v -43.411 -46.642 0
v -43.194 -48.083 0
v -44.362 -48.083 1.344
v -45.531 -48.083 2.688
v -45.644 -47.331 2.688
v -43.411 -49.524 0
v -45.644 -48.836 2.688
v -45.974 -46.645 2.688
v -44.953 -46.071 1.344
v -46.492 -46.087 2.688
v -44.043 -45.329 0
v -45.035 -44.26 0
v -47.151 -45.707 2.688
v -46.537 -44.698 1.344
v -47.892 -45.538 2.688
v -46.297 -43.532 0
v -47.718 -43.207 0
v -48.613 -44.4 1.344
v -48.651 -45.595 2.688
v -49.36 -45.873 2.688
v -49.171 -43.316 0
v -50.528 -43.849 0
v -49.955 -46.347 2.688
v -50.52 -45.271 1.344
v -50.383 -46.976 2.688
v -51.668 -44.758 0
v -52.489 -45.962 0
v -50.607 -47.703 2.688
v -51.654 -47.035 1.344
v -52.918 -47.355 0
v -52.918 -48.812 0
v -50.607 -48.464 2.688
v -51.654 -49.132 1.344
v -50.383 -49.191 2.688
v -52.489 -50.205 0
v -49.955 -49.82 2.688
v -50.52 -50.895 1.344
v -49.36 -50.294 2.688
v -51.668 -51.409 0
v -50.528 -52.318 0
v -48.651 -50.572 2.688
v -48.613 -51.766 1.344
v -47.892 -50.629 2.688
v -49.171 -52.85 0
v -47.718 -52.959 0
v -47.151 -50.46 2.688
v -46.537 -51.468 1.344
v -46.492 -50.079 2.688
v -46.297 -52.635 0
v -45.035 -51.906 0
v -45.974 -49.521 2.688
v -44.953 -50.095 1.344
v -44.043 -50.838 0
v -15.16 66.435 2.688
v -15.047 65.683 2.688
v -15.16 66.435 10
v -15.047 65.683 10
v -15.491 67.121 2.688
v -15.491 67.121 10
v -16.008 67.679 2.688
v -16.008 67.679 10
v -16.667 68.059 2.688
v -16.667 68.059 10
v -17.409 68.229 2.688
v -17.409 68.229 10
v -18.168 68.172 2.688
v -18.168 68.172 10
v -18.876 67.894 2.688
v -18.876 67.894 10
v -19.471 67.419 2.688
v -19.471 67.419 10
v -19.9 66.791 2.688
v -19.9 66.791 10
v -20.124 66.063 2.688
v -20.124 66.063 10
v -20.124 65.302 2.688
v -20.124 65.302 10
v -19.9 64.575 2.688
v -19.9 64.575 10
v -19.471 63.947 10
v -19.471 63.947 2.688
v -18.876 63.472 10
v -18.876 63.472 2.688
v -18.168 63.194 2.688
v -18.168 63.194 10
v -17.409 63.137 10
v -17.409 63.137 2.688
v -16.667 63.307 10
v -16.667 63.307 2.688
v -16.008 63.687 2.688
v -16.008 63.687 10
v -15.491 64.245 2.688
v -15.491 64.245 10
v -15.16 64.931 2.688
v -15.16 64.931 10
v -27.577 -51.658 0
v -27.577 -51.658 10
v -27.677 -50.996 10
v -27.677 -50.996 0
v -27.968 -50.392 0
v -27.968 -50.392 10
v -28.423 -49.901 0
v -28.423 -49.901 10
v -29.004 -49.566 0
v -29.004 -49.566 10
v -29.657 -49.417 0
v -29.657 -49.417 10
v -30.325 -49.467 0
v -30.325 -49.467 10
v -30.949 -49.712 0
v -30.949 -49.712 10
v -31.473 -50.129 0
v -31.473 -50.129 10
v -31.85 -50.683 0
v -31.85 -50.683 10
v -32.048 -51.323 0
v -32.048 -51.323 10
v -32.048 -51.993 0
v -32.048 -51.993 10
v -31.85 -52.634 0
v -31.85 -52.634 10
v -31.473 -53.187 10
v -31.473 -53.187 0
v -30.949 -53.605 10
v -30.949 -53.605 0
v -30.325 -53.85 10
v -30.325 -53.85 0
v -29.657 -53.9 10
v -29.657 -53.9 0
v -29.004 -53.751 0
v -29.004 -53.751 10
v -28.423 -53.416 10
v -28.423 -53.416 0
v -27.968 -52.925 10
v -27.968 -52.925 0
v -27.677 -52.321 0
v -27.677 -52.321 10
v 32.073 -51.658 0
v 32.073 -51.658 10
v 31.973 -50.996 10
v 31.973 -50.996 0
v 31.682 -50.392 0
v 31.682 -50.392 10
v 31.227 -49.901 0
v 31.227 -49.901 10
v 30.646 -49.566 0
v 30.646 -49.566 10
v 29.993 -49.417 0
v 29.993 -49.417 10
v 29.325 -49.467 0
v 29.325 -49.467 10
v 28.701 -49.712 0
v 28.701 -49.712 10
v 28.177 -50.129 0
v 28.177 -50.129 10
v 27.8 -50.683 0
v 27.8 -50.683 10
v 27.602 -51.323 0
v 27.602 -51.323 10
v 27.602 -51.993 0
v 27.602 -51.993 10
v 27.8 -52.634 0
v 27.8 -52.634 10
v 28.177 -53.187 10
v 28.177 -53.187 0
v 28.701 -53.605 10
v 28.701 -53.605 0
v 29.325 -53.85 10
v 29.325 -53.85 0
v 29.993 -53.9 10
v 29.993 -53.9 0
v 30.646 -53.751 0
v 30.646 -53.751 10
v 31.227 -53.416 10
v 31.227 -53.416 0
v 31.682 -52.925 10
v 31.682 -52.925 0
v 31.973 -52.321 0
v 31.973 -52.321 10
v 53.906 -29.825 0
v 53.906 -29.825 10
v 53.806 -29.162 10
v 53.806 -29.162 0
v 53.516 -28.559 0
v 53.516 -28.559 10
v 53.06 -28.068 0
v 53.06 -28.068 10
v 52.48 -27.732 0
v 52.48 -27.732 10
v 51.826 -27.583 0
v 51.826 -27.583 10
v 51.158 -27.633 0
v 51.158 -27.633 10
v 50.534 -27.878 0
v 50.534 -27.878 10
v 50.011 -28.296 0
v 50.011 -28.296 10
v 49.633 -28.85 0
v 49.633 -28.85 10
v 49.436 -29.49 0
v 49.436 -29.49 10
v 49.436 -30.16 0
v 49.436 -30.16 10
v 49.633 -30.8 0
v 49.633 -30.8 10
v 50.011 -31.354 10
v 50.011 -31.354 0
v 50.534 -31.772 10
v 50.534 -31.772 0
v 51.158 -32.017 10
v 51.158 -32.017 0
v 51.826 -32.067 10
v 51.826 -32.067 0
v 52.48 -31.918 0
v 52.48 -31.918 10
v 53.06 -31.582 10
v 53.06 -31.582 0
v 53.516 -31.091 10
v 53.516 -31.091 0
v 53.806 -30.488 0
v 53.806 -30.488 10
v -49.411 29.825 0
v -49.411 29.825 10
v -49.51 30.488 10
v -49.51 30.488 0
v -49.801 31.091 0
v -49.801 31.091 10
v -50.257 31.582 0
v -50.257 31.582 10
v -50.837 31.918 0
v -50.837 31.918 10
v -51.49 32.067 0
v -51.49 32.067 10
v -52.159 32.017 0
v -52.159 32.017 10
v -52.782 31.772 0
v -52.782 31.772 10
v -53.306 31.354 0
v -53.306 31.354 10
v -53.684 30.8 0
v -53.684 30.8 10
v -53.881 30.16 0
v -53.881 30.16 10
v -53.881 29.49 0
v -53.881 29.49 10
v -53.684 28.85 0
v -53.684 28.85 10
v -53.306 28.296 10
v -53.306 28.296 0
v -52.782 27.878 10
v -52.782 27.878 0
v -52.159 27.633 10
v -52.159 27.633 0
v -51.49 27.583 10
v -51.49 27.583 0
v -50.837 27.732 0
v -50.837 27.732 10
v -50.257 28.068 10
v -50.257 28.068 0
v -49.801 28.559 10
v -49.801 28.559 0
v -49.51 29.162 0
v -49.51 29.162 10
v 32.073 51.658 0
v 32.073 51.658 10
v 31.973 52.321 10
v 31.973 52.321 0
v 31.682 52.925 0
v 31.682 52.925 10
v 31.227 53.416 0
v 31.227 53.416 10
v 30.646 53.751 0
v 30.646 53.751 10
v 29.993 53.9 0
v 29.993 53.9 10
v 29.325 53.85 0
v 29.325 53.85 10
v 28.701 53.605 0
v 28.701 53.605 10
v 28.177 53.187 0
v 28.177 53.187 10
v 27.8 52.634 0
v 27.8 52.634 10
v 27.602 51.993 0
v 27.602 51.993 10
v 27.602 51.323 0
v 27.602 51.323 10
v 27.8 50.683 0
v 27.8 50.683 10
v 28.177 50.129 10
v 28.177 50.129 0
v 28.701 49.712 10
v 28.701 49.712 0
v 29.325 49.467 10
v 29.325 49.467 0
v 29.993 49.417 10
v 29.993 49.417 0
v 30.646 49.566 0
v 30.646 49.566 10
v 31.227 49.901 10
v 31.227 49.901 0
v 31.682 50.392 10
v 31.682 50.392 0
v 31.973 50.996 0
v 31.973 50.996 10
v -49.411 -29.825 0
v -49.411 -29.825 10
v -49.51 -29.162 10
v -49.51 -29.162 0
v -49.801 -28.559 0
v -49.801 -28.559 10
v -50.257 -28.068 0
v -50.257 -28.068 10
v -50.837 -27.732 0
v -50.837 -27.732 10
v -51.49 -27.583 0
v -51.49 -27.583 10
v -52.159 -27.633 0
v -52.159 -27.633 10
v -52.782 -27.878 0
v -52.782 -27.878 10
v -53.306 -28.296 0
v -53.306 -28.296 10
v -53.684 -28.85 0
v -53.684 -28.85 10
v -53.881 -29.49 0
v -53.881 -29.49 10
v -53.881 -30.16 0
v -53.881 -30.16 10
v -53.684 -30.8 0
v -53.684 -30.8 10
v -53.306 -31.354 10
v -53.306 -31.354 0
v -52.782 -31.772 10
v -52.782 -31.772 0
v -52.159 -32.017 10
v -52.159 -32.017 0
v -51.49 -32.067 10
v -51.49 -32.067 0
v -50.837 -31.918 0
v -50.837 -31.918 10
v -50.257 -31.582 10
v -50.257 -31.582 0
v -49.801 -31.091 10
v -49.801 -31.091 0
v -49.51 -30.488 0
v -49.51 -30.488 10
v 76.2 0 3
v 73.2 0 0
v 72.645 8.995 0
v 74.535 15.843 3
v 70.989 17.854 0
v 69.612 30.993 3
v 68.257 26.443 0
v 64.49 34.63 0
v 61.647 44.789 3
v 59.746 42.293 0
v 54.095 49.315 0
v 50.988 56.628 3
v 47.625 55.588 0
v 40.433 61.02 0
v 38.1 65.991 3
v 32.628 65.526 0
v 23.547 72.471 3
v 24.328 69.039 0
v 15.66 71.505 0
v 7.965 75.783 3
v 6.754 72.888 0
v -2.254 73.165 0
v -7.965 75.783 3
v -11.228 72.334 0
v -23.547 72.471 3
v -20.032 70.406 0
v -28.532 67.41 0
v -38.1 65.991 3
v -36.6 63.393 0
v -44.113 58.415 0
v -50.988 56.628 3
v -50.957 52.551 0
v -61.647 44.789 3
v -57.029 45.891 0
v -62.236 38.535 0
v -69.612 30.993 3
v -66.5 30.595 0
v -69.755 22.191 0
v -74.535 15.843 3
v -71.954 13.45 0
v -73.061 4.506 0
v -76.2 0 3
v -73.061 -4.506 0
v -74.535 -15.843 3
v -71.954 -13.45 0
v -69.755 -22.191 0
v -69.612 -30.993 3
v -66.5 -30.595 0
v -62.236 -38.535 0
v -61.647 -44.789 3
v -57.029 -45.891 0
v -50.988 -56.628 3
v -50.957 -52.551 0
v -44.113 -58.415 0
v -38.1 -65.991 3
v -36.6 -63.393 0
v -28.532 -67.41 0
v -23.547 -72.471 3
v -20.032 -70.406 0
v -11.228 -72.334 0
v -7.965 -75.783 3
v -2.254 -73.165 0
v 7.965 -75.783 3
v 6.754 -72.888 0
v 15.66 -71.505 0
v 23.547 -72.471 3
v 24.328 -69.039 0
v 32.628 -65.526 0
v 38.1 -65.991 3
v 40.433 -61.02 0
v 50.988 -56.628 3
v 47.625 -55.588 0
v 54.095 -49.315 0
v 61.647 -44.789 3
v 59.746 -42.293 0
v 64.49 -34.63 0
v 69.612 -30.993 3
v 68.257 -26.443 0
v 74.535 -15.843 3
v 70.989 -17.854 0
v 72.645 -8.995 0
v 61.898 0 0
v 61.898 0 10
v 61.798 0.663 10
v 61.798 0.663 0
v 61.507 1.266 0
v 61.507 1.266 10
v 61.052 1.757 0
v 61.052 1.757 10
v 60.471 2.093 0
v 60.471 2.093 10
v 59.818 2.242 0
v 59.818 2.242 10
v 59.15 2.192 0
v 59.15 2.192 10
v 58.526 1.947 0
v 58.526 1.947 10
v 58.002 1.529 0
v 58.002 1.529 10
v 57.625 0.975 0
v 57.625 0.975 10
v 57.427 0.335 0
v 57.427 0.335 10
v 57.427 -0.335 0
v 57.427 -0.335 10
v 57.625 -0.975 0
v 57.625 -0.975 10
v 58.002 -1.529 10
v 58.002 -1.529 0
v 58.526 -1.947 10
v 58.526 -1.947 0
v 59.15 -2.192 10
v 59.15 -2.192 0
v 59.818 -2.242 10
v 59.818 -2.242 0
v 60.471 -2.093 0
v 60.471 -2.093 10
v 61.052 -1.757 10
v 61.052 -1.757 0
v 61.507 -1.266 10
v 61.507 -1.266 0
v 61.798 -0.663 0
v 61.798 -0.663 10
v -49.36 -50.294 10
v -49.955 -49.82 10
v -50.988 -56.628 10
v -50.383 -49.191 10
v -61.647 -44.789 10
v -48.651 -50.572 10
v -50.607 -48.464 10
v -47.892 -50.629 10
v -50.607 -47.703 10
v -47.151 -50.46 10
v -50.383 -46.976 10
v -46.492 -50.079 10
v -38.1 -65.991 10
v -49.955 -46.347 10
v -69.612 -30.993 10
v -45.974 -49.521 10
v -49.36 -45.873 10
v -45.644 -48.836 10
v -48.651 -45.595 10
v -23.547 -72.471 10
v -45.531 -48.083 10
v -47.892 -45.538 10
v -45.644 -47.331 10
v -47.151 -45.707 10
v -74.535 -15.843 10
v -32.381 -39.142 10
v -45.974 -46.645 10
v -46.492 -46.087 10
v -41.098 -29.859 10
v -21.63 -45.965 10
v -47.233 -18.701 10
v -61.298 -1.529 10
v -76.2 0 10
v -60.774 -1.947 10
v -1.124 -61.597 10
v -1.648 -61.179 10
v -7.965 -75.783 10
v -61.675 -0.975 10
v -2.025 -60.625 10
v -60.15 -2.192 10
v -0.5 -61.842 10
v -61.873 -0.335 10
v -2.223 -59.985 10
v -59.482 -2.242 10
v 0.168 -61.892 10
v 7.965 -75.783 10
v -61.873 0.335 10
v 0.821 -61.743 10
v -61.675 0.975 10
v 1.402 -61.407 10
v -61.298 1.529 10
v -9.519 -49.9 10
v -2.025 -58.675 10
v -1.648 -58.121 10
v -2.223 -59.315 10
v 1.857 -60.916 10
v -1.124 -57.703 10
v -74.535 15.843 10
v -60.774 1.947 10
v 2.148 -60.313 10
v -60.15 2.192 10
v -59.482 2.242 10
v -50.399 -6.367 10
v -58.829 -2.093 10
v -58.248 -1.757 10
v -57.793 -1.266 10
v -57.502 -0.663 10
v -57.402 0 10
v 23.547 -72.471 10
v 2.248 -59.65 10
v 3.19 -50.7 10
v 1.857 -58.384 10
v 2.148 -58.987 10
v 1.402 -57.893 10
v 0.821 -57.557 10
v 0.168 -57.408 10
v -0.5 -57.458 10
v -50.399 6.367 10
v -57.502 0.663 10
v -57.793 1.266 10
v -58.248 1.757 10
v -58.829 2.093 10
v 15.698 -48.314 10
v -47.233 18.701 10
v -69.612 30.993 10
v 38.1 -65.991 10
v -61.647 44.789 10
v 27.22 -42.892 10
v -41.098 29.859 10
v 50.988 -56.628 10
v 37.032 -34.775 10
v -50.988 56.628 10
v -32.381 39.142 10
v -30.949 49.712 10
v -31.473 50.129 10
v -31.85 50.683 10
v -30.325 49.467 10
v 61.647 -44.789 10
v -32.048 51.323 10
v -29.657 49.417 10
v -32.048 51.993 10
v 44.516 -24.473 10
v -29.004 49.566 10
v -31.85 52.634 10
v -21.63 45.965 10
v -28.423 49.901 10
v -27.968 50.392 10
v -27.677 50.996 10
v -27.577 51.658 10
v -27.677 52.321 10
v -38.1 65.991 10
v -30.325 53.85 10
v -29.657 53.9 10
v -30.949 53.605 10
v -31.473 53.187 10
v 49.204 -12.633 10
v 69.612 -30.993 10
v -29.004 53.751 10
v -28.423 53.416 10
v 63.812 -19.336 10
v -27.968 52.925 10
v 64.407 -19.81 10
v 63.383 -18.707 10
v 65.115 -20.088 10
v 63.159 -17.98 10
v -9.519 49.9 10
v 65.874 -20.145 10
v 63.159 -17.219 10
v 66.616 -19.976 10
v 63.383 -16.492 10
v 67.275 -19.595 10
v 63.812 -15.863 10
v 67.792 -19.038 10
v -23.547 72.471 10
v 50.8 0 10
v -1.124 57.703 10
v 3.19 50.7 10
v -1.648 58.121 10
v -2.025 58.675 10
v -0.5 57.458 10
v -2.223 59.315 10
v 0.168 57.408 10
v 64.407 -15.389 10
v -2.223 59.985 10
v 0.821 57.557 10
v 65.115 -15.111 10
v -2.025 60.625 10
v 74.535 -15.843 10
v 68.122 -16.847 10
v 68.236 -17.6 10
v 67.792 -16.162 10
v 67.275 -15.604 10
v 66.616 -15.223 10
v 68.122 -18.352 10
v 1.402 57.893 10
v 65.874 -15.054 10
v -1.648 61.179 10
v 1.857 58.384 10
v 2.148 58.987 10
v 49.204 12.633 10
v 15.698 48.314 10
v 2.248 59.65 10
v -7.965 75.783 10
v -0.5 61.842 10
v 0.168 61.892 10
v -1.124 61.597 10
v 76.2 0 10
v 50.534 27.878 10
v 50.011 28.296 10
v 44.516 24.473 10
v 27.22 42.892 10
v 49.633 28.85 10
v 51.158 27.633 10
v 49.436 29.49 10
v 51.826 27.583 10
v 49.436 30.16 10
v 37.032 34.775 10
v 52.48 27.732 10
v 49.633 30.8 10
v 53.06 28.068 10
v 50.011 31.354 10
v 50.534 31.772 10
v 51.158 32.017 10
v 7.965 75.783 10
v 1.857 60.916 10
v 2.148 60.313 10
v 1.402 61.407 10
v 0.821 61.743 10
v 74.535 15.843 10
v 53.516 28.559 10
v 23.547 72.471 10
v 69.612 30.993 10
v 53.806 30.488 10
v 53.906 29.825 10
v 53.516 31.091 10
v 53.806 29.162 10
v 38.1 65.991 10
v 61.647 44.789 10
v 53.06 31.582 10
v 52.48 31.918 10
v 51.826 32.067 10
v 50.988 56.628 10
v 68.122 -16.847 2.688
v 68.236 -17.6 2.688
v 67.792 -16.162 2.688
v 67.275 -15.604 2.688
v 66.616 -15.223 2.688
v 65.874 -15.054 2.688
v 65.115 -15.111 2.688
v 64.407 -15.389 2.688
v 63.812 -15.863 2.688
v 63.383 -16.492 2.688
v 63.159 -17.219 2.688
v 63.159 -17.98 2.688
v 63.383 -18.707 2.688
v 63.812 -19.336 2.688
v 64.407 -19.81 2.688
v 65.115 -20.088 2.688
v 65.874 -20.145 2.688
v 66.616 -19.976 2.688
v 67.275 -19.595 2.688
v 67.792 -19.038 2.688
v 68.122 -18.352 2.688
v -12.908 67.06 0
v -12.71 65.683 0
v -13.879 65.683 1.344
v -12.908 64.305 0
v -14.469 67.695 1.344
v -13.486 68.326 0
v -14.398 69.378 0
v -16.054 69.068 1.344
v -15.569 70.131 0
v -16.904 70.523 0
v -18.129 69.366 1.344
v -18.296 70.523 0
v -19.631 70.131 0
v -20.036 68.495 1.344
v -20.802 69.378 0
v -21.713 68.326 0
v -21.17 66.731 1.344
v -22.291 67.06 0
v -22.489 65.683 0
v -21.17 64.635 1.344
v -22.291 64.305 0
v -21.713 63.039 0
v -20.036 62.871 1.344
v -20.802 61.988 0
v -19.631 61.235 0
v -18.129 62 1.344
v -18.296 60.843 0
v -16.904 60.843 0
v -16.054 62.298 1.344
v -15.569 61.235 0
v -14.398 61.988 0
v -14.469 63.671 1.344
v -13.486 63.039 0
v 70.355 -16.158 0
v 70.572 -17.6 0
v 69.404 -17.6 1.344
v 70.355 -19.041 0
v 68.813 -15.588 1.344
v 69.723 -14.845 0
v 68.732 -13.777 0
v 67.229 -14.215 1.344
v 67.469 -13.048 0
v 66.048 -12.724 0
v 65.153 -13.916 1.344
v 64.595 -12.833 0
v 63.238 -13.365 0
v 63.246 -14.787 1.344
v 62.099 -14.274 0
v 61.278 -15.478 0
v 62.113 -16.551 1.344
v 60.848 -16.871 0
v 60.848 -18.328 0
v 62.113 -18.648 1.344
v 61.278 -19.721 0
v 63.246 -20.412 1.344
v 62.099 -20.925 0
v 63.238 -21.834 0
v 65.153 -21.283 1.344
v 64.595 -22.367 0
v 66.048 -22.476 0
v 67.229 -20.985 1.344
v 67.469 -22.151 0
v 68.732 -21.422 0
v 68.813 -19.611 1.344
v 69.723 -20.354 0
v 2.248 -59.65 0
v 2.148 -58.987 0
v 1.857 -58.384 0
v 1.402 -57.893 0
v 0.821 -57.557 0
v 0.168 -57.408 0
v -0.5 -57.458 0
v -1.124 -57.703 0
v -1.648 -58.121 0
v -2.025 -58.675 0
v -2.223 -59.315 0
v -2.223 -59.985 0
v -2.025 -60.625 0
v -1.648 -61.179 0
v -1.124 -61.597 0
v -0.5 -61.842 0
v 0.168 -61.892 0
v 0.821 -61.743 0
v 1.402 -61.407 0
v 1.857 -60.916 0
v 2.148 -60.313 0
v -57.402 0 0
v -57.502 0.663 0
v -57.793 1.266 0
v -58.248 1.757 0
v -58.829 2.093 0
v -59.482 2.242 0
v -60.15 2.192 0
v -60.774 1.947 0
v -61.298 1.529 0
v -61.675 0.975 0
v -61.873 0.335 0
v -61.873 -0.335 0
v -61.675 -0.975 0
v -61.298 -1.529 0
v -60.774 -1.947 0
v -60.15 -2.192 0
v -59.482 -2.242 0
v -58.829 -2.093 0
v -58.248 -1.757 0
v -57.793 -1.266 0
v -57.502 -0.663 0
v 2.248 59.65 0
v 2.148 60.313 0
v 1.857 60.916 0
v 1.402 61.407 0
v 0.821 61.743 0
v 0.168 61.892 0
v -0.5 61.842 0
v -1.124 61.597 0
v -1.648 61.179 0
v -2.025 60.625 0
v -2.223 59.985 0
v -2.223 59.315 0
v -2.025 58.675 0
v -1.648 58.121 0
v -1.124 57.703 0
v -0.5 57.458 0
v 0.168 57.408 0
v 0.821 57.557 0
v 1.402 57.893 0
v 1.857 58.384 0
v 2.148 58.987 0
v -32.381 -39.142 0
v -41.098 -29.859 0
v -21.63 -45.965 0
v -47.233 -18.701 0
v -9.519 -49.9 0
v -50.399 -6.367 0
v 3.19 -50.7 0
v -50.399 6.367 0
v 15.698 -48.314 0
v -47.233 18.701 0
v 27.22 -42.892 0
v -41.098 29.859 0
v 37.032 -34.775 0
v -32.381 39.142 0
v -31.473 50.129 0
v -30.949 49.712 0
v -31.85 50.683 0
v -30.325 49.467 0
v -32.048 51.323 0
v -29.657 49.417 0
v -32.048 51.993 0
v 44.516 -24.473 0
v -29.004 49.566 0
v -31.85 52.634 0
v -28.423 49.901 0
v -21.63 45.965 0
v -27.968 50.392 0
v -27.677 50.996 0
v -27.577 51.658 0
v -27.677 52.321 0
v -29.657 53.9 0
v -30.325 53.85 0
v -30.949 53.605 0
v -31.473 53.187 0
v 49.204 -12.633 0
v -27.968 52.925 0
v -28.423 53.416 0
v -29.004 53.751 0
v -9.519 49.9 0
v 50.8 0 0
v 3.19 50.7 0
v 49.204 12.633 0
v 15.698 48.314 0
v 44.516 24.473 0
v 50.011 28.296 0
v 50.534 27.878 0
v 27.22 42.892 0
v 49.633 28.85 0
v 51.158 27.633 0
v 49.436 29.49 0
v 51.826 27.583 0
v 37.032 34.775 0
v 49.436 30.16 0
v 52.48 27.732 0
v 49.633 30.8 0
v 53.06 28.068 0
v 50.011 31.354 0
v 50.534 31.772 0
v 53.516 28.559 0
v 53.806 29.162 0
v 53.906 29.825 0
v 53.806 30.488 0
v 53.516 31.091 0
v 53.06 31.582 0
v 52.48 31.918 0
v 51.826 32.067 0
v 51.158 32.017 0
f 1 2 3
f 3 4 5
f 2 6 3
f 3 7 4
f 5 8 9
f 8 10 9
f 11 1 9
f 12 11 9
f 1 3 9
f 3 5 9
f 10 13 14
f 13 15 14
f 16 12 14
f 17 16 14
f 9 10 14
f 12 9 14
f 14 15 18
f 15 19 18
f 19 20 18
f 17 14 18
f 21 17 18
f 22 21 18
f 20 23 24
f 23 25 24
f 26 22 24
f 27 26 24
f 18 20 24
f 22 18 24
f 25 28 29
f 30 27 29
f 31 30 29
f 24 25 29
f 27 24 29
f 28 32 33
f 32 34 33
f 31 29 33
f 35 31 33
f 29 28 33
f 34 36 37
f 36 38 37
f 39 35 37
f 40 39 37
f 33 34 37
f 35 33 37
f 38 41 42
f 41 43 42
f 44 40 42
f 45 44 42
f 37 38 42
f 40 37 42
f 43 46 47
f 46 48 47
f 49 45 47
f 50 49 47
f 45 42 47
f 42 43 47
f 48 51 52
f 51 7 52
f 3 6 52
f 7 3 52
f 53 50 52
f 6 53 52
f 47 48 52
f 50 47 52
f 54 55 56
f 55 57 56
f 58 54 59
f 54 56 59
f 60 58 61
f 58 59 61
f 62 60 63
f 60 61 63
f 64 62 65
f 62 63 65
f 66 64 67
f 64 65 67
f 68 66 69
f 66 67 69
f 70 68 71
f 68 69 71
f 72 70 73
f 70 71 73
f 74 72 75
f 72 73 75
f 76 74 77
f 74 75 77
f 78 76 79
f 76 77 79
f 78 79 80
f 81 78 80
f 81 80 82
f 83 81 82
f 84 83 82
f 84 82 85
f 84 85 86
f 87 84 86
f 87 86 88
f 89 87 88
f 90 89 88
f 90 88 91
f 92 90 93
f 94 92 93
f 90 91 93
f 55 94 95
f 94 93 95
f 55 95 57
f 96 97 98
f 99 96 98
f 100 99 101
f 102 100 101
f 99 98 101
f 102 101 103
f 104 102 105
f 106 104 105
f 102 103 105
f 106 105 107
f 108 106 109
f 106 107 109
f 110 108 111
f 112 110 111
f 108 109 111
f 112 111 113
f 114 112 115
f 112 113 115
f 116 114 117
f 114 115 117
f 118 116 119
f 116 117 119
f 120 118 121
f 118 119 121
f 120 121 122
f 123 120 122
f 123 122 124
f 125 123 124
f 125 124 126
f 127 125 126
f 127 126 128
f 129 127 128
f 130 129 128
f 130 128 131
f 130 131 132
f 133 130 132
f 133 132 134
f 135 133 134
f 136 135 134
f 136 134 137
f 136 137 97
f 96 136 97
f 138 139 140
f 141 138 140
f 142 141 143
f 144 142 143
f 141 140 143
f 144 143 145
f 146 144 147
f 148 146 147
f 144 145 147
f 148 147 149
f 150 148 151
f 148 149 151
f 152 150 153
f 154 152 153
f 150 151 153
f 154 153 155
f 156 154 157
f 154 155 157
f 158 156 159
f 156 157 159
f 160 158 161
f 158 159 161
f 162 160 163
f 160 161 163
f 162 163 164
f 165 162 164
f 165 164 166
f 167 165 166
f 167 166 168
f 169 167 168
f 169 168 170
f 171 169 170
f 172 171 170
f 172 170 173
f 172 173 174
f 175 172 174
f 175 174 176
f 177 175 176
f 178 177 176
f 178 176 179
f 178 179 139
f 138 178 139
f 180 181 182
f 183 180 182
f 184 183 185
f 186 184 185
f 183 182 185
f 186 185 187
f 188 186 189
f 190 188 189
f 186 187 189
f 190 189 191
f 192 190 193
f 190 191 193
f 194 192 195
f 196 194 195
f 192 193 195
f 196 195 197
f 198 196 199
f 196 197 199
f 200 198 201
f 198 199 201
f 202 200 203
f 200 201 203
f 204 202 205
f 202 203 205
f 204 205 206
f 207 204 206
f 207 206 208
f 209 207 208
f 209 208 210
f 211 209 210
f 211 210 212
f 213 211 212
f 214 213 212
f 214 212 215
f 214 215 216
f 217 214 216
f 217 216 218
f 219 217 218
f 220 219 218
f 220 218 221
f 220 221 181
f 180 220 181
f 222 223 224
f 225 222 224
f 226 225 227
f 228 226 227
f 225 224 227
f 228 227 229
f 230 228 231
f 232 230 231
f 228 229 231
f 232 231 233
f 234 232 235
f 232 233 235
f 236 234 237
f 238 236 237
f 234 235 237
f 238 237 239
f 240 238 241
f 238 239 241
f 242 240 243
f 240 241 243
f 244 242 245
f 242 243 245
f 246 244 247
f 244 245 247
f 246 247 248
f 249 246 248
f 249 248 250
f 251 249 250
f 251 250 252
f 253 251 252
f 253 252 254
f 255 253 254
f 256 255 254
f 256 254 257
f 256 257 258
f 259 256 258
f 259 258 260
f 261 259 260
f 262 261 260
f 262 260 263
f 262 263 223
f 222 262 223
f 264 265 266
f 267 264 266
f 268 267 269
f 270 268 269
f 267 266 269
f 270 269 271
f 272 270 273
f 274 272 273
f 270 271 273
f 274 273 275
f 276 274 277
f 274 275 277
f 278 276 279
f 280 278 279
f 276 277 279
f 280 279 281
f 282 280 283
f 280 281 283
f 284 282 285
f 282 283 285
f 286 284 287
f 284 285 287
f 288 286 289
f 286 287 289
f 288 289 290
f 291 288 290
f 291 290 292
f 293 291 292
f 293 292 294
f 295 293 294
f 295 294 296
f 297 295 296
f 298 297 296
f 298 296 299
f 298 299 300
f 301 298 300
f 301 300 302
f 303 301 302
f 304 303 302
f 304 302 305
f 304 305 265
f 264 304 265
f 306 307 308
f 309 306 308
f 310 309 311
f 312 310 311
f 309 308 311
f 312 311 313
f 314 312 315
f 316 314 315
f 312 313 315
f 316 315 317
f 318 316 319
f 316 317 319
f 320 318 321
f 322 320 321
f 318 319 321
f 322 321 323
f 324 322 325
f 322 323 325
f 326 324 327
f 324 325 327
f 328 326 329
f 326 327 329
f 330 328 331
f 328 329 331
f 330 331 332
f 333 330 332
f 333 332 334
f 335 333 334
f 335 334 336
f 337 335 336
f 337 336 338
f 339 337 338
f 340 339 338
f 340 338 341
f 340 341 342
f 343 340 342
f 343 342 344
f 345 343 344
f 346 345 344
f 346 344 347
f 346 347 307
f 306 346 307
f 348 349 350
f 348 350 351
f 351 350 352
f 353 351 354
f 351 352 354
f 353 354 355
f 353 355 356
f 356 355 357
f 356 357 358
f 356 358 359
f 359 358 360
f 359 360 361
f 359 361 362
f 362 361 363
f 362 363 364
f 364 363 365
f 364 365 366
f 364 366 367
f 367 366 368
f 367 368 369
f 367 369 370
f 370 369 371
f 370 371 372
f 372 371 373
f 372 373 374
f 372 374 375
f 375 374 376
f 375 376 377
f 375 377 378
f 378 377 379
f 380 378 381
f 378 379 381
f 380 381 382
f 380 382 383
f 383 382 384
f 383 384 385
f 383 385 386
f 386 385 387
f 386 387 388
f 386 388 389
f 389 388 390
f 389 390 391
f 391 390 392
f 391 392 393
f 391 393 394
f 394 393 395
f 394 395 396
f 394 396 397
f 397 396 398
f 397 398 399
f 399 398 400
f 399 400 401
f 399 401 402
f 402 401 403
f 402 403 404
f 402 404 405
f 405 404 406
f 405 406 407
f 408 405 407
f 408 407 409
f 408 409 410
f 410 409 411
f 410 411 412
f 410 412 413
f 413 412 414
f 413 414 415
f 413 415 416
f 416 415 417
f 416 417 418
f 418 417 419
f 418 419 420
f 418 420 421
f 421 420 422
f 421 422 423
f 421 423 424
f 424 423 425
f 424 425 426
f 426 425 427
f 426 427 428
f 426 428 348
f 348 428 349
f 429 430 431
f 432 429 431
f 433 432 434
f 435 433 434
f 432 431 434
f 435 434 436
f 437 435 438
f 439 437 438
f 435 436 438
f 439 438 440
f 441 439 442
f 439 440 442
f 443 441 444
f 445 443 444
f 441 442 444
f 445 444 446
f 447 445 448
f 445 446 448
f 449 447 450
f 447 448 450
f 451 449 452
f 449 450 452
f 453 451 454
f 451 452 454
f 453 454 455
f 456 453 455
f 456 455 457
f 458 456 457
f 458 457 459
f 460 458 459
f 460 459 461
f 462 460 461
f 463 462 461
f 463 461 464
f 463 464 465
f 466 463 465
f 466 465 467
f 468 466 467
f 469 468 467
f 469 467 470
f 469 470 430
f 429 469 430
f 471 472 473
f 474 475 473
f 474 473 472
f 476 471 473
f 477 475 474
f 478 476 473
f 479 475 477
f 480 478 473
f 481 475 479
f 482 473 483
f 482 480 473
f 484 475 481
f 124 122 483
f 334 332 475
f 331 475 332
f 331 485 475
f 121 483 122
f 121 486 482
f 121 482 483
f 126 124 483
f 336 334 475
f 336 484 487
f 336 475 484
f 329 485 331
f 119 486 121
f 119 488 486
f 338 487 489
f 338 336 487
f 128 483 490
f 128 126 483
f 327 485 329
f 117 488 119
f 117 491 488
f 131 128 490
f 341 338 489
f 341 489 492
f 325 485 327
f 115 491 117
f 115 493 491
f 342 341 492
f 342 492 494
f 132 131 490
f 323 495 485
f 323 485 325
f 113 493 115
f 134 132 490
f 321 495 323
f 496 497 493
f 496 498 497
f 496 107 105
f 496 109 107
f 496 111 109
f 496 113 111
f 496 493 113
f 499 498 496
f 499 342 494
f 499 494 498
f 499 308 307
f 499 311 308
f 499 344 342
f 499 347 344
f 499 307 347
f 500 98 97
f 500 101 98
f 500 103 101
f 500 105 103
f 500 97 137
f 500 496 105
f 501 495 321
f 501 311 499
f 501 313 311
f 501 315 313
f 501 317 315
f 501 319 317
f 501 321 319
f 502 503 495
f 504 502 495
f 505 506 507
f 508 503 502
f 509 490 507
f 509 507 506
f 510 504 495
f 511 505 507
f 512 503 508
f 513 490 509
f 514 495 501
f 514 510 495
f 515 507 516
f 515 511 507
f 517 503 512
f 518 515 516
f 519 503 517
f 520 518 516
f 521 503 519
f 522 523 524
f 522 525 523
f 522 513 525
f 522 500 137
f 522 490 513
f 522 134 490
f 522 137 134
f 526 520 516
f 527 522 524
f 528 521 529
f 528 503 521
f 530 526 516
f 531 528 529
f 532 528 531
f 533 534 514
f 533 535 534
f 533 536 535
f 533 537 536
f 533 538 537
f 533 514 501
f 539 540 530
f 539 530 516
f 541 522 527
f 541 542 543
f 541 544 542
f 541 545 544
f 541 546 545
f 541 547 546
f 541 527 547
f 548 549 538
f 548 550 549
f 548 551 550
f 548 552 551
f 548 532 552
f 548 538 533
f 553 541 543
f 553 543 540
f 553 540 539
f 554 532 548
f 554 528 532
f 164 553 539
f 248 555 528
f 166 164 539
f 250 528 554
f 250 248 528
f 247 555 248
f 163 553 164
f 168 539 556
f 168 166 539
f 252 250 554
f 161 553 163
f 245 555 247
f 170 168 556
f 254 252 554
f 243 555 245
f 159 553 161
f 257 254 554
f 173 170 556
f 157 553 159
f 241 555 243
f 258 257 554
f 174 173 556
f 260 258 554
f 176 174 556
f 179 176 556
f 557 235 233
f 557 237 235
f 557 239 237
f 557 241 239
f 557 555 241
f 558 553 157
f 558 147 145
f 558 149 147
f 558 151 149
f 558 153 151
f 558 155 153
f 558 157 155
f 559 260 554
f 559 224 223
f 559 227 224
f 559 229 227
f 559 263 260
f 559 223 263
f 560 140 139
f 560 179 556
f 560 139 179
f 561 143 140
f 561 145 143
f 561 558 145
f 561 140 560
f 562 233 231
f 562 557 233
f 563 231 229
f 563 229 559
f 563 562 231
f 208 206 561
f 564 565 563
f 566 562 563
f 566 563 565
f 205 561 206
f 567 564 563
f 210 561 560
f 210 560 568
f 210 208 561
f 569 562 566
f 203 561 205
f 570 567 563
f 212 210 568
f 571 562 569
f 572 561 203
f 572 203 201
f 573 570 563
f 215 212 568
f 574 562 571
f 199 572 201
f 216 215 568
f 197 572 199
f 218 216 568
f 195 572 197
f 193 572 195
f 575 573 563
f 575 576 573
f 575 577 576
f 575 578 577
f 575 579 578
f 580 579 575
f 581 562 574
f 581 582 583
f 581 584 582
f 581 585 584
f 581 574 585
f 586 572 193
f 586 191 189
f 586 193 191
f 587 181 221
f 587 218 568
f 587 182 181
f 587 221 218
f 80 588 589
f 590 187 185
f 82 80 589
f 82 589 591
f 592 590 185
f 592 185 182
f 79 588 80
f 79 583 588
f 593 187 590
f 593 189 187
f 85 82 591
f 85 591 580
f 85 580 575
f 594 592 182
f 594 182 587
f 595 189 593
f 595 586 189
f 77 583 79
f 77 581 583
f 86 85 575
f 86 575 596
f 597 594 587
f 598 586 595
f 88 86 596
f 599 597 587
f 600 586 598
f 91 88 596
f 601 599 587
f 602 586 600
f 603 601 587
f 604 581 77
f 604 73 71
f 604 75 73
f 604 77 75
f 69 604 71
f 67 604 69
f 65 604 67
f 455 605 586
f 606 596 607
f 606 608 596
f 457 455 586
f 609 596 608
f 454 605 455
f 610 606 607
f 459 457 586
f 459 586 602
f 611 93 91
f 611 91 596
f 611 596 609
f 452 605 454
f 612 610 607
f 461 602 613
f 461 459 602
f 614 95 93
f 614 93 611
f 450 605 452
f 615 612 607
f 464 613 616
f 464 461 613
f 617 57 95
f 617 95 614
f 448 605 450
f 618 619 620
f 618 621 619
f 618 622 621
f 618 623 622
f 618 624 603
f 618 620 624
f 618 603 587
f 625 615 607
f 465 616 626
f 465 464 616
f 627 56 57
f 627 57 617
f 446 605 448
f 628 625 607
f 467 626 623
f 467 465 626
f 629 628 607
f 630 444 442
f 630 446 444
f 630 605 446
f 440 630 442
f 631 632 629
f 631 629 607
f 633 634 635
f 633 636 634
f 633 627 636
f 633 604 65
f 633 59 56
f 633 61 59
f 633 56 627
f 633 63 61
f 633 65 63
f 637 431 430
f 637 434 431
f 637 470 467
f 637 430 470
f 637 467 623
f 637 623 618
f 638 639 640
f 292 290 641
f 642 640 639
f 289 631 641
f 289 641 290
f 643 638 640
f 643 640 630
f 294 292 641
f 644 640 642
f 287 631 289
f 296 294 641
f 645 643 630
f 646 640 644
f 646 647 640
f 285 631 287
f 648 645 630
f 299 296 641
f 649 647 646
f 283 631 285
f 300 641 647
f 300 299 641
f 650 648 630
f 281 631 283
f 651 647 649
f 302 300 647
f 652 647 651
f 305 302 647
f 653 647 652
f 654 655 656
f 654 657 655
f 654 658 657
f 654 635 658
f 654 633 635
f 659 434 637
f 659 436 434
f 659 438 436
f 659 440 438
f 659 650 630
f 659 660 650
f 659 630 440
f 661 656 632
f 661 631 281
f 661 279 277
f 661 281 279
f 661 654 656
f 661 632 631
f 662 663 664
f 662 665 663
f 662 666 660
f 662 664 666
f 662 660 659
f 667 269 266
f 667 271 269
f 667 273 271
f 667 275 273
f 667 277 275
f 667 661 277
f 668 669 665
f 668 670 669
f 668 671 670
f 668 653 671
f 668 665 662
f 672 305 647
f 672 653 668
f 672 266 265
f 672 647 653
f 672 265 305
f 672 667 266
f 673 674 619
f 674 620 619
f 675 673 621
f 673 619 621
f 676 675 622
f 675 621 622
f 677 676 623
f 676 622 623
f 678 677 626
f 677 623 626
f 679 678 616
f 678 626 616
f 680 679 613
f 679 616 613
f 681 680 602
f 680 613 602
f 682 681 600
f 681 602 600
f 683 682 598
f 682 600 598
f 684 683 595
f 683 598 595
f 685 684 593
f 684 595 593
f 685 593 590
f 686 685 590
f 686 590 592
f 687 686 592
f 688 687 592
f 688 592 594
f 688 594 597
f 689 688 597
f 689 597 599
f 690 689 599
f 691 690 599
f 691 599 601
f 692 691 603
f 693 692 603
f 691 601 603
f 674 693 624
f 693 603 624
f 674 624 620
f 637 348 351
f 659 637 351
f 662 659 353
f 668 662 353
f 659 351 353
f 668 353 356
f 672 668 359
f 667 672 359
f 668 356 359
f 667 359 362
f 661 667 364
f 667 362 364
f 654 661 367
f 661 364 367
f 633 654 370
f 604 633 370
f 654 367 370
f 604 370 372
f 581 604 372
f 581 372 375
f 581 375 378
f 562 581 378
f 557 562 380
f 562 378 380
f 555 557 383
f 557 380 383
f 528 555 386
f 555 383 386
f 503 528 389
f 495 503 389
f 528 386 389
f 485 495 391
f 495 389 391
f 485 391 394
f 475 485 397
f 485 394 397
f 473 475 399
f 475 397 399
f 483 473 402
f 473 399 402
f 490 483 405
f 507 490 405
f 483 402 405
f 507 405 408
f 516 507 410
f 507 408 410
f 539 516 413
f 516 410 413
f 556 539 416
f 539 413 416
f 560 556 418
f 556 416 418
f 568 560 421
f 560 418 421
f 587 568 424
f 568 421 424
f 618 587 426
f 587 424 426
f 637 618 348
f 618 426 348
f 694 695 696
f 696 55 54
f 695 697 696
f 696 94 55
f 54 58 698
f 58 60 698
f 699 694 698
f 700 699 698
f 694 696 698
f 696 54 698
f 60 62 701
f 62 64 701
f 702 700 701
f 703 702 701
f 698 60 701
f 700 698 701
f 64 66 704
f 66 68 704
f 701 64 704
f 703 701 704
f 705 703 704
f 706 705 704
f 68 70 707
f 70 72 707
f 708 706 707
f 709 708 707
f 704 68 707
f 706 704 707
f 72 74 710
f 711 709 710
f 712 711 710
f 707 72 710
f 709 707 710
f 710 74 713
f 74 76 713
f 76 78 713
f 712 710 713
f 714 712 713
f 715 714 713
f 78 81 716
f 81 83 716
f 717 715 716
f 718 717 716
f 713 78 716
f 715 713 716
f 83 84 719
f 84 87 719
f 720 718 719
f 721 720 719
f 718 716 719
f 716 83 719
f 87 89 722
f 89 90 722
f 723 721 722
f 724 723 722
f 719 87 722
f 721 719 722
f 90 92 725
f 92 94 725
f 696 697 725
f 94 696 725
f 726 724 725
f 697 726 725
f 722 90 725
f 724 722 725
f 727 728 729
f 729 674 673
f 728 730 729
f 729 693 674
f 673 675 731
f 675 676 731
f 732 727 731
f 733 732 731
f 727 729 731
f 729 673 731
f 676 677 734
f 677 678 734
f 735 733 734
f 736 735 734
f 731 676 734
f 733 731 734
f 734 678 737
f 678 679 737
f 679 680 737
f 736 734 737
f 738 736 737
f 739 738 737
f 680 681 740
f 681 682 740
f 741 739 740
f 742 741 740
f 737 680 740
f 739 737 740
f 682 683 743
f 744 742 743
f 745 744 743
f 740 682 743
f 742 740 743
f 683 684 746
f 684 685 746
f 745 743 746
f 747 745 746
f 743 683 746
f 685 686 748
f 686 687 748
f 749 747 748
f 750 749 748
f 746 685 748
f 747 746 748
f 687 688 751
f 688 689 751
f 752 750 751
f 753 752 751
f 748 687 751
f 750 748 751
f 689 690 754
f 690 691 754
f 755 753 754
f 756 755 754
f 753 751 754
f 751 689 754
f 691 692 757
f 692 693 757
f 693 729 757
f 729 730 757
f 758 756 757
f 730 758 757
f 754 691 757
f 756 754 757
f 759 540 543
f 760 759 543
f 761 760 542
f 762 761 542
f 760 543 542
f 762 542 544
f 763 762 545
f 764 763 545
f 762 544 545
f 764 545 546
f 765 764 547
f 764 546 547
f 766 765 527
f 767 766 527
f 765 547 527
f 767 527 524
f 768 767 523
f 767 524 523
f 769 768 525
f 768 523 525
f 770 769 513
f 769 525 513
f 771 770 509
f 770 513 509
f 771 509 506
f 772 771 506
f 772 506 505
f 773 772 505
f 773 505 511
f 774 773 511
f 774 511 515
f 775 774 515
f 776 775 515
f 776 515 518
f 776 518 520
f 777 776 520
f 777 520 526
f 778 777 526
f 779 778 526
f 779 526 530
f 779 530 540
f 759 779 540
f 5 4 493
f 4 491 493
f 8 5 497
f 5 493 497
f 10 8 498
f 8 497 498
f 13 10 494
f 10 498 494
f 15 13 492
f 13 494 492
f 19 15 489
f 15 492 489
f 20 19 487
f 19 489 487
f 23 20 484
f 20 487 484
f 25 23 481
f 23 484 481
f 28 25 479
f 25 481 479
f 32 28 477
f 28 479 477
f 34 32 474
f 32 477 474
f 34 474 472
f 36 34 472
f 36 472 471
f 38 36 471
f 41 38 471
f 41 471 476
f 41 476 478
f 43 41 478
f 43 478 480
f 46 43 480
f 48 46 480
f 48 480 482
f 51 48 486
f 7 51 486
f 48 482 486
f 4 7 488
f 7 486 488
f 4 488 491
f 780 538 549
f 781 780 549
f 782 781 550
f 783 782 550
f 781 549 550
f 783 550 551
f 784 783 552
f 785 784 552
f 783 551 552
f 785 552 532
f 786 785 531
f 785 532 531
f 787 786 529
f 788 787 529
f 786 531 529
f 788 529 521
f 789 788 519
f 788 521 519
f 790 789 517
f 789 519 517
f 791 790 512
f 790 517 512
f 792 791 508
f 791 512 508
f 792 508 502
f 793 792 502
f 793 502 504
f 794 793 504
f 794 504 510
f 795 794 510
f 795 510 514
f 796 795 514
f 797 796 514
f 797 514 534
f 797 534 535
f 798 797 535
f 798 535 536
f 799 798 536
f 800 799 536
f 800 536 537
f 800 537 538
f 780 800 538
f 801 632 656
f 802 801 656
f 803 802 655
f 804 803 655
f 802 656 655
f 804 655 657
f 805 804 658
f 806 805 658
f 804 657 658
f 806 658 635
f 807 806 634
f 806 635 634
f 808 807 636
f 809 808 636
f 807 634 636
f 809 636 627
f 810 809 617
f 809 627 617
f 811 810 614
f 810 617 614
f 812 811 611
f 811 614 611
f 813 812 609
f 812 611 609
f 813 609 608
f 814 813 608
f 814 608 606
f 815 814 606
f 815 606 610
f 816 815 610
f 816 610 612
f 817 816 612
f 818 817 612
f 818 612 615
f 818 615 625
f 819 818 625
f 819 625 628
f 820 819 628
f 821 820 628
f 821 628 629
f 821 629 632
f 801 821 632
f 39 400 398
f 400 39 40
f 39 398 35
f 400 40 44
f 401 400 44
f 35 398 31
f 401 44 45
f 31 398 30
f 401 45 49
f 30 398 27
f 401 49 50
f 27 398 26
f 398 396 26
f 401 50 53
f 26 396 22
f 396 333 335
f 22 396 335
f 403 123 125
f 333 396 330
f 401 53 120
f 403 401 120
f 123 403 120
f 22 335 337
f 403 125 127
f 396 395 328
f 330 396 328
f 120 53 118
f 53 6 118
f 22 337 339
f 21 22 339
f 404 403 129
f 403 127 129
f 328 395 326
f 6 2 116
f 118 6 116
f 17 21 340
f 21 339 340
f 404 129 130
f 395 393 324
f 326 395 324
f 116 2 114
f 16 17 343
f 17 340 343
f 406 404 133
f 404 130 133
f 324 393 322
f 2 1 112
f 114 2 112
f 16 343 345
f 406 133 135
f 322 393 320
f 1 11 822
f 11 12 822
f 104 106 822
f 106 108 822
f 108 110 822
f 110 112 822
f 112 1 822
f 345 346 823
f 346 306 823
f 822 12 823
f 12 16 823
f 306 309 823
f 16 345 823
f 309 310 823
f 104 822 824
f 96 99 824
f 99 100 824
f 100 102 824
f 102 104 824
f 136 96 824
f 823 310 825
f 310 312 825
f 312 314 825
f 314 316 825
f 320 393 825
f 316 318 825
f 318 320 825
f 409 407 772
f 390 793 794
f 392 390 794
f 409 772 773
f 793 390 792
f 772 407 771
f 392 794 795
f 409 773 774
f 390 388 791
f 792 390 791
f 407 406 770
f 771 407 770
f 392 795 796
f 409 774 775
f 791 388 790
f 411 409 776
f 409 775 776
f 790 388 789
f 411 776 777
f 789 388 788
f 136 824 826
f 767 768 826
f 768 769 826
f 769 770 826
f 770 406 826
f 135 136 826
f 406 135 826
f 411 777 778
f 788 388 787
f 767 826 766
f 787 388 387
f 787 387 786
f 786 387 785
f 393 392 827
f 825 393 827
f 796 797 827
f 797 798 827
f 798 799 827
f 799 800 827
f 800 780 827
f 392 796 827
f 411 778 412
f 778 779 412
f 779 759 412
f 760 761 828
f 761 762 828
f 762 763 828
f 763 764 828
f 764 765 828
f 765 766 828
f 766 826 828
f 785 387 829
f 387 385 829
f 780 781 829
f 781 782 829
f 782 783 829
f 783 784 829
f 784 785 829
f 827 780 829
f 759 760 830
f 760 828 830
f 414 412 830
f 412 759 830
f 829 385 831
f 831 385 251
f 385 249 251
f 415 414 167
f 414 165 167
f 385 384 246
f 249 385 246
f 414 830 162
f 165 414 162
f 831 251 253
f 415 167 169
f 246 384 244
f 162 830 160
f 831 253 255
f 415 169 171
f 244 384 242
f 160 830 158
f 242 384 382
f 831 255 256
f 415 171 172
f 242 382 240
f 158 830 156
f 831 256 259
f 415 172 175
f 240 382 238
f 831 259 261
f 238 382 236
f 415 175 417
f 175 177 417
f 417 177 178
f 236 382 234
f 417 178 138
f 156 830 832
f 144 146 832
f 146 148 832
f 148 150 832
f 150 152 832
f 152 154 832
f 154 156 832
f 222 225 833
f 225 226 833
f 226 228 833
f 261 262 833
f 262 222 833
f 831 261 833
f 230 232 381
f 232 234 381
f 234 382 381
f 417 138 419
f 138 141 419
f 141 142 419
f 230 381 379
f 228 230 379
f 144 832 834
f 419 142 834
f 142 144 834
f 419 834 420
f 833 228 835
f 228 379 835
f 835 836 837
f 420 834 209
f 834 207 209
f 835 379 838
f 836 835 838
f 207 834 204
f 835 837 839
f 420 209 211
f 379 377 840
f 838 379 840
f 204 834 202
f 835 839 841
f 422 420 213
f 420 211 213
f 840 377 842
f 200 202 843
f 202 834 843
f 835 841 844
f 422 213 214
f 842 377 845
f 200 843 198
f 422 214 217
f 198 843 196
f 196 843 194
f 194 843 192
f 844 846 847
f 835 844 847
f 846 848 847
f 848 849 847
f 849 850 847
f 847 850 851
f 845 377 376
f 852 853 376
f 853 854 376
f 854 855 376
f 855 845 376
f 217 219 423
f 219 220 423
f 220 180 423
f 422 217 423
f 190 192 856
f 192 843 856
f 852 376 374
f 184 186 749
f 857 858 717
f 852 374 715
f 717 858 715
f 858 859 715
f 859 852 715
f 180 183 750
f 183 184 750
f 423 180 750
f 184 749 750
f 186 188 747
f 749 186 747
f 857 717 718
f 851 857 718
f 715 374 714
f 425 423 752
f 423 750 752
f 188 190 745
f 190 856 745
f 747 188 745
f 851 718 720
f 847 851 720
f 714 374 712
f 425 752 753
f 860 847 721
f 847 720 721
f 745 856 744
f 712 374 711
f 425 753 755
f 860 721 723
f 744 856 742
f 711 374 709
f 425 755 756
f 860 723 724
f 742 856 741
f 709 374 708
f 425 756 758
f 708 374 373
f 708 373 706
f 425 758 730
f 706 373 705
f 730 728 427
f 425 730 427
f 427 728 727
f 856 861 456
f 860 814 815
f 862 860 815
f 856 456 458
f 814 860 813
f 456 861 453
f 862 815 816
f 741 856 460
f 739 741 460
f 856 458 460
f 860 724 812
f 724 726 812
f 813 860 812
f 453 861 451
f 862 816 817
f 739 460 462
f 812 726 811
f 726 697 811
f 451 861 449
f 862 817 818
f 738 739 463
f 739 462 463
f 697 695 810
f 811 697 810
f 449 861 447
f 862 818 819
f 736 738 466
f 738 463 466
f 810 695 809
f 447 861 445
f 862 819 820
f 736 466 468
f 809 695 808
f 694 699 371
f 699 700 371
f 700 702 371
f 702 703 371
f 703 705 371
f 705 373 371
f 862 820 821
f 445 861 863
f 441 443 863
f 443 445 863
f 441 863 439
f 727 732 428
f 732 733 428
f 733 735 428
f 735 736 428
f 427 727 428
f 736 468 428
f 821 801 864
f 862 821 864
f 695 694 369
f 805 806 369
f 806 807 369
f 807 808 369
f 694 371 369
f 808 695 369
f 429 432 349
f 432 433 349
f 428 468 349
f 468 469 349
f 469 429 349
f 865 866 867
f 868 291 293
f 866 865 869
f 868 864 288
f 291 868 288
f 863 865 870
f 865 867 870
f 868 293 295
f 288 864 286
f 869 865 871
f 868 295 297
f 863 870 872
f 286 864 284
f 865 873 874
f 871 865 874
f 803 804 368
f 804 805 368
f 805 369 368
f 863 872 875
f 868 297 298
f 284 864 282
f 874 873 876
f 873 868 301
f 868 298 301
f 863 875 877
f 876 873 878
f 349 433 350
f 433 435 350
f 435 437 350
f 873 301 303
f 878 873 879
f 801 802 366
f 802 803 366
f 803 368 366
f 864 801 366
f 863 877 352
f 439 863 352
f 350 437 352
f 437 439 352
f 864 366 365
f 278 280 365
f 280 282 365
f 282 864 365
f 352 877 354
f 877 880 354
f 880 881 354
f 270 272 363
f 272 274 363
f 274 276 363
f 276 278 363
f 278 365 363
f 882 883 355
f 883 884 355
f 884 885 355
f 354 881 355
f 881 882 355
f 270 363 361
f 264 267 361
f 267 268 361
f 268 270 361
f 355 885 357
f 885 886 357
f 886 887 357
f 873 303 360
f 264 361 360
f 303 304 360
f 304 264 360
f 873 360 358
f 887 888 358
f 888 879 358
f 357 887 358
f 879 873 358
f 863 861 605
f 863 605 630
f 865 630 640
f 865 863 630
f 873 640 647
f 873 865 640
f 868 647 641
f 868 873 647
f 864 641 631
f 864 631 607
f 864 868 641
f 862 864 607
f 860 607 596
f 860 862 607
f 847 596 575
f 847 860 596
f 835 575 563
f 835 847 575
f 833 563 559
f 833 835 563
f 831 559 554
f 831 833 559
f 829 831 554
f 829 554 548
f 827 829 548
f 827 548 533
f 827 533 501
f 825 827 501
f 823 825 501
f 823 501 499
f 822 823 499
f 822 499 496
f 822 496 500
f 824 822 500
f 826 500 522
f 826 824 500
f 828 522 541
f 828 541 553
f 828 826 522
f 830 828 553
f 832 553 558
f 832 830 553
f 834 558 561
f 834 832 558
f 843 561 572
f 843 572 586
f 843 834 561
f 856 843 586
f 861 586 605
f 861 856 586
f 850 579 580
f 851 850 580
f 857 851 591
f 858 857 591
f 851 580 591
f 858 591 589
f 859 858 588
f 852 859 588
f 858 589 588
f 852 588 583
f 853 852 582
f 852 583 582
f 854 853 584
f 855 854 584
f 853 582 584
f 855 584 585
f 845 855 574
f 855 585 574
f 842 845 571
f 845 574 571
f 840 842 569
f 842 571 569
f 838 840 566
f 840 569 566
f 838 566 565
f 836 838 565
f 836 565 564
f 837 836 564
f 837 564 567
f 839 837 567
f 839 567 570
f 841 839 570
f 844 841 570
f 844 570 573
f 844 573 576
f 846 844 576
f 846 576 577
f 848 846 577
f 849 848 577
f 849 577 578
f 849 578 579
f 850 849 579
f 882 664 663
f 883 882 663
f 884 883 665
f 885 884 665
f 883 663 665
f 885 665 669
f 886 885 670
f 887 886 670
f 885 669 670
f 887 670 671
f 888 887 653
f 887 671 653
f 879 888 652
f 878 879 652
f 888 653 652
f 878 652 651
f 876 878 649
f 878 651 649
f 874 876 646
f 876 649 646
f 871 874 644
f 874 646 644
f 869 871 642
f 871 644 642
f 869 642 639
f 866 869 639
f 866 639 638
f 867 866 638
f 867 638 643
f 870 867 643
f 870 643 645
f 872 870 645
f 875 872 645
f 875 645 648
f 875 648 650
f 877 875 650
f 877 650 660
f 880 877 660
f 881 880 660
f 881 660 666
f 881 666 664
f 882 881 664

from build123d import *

# Parameters (mm, degrees)
ESQUISSE2_R                                       = 76.2
ESQUISSE2_R_2                                     = 50.8
BOSS_EXTRU_1_DEPTH                                = 10
CHANFREIN1_SIZE                                   = 3
D_GAGEMENT_81_D                                   = 4.4958
FRAISAGE_POUR_VIS_T_TE_FRAIS_E_BOMB_E_D           = 5.1054
FRAISAGE_POUR_VIS_T_TE_FRAIS_E_BOMB_E_CSINK_D     = 9.779
FRAISAGE_POUR_VIS_T_TE_FRAIS_E_BOMB_E_CSINK_ANGLE = 82


with BuildPart() as part:
    # Esquisse2 → Boss.-Extru.1 (new body)
    with BuildSketch(Plane.XY):
        Circle(ESQUISSE2_R)
        Circle(ESQUISSE2_R_2, mode=Mode.SUBTRACT)
    extrude(amount=BOSS_EXTRU_1_DEPTH)

    # Chanfrein1
    chanfrein1_edges = [part.edges().sort_by_distance(p)[0] for p in [
        (-76.2, 0, 0),
    ]]
    chamfer(chanfrein1_edges, length=CHANFREIN1_SIZE)

    # Dégagement #81 (through all)
    with Locations(Plane(origin=(0, 0, 0), x_dir=(-1, 0, 0), z_dir=(0, 0, -1))):
        with Locations((0, 59.65), (51.658415336, 29.825), (29.825, 51.658415336), (59.65, 0), (51.658415336, -29.825), (29.825, -51.658415336), (0, -59.65), (-29.825, -51.658415336), (-51.658415336, -29.825), (-59.65, 0), (-51.658415336, 29.825), (-29.825, 51.658415336)):
            Hole(D_GAGEMENT_81_D / 2)

    # Fraisage pour vis à tête fraisée bombée #101 (through all)
    with Locations(Plane(origin=(0, 0, 0), x_dir=(-1, 0, 0), z_dir=(0, 0, -1))):
        with Locations((48.083261121, -48.083261121), (-65.682956188, -17.599695067), (17.599695067, 65.682956188)):
            CounterSinkHole(FRAISAGE_POUR_VIS_T_TE_FRAIS_E_BOMB_E_D / 2, FRAISAGE_POUR_VIS_T_TE_FRAIS_E_BOMB_E_CSINK_D / 2, counter_sink_angle=FRAISAGE_POUR_VIS_T_TE_FRAIS_E_BOMB_E_CSINK_ANGLE)


solid = part.part
